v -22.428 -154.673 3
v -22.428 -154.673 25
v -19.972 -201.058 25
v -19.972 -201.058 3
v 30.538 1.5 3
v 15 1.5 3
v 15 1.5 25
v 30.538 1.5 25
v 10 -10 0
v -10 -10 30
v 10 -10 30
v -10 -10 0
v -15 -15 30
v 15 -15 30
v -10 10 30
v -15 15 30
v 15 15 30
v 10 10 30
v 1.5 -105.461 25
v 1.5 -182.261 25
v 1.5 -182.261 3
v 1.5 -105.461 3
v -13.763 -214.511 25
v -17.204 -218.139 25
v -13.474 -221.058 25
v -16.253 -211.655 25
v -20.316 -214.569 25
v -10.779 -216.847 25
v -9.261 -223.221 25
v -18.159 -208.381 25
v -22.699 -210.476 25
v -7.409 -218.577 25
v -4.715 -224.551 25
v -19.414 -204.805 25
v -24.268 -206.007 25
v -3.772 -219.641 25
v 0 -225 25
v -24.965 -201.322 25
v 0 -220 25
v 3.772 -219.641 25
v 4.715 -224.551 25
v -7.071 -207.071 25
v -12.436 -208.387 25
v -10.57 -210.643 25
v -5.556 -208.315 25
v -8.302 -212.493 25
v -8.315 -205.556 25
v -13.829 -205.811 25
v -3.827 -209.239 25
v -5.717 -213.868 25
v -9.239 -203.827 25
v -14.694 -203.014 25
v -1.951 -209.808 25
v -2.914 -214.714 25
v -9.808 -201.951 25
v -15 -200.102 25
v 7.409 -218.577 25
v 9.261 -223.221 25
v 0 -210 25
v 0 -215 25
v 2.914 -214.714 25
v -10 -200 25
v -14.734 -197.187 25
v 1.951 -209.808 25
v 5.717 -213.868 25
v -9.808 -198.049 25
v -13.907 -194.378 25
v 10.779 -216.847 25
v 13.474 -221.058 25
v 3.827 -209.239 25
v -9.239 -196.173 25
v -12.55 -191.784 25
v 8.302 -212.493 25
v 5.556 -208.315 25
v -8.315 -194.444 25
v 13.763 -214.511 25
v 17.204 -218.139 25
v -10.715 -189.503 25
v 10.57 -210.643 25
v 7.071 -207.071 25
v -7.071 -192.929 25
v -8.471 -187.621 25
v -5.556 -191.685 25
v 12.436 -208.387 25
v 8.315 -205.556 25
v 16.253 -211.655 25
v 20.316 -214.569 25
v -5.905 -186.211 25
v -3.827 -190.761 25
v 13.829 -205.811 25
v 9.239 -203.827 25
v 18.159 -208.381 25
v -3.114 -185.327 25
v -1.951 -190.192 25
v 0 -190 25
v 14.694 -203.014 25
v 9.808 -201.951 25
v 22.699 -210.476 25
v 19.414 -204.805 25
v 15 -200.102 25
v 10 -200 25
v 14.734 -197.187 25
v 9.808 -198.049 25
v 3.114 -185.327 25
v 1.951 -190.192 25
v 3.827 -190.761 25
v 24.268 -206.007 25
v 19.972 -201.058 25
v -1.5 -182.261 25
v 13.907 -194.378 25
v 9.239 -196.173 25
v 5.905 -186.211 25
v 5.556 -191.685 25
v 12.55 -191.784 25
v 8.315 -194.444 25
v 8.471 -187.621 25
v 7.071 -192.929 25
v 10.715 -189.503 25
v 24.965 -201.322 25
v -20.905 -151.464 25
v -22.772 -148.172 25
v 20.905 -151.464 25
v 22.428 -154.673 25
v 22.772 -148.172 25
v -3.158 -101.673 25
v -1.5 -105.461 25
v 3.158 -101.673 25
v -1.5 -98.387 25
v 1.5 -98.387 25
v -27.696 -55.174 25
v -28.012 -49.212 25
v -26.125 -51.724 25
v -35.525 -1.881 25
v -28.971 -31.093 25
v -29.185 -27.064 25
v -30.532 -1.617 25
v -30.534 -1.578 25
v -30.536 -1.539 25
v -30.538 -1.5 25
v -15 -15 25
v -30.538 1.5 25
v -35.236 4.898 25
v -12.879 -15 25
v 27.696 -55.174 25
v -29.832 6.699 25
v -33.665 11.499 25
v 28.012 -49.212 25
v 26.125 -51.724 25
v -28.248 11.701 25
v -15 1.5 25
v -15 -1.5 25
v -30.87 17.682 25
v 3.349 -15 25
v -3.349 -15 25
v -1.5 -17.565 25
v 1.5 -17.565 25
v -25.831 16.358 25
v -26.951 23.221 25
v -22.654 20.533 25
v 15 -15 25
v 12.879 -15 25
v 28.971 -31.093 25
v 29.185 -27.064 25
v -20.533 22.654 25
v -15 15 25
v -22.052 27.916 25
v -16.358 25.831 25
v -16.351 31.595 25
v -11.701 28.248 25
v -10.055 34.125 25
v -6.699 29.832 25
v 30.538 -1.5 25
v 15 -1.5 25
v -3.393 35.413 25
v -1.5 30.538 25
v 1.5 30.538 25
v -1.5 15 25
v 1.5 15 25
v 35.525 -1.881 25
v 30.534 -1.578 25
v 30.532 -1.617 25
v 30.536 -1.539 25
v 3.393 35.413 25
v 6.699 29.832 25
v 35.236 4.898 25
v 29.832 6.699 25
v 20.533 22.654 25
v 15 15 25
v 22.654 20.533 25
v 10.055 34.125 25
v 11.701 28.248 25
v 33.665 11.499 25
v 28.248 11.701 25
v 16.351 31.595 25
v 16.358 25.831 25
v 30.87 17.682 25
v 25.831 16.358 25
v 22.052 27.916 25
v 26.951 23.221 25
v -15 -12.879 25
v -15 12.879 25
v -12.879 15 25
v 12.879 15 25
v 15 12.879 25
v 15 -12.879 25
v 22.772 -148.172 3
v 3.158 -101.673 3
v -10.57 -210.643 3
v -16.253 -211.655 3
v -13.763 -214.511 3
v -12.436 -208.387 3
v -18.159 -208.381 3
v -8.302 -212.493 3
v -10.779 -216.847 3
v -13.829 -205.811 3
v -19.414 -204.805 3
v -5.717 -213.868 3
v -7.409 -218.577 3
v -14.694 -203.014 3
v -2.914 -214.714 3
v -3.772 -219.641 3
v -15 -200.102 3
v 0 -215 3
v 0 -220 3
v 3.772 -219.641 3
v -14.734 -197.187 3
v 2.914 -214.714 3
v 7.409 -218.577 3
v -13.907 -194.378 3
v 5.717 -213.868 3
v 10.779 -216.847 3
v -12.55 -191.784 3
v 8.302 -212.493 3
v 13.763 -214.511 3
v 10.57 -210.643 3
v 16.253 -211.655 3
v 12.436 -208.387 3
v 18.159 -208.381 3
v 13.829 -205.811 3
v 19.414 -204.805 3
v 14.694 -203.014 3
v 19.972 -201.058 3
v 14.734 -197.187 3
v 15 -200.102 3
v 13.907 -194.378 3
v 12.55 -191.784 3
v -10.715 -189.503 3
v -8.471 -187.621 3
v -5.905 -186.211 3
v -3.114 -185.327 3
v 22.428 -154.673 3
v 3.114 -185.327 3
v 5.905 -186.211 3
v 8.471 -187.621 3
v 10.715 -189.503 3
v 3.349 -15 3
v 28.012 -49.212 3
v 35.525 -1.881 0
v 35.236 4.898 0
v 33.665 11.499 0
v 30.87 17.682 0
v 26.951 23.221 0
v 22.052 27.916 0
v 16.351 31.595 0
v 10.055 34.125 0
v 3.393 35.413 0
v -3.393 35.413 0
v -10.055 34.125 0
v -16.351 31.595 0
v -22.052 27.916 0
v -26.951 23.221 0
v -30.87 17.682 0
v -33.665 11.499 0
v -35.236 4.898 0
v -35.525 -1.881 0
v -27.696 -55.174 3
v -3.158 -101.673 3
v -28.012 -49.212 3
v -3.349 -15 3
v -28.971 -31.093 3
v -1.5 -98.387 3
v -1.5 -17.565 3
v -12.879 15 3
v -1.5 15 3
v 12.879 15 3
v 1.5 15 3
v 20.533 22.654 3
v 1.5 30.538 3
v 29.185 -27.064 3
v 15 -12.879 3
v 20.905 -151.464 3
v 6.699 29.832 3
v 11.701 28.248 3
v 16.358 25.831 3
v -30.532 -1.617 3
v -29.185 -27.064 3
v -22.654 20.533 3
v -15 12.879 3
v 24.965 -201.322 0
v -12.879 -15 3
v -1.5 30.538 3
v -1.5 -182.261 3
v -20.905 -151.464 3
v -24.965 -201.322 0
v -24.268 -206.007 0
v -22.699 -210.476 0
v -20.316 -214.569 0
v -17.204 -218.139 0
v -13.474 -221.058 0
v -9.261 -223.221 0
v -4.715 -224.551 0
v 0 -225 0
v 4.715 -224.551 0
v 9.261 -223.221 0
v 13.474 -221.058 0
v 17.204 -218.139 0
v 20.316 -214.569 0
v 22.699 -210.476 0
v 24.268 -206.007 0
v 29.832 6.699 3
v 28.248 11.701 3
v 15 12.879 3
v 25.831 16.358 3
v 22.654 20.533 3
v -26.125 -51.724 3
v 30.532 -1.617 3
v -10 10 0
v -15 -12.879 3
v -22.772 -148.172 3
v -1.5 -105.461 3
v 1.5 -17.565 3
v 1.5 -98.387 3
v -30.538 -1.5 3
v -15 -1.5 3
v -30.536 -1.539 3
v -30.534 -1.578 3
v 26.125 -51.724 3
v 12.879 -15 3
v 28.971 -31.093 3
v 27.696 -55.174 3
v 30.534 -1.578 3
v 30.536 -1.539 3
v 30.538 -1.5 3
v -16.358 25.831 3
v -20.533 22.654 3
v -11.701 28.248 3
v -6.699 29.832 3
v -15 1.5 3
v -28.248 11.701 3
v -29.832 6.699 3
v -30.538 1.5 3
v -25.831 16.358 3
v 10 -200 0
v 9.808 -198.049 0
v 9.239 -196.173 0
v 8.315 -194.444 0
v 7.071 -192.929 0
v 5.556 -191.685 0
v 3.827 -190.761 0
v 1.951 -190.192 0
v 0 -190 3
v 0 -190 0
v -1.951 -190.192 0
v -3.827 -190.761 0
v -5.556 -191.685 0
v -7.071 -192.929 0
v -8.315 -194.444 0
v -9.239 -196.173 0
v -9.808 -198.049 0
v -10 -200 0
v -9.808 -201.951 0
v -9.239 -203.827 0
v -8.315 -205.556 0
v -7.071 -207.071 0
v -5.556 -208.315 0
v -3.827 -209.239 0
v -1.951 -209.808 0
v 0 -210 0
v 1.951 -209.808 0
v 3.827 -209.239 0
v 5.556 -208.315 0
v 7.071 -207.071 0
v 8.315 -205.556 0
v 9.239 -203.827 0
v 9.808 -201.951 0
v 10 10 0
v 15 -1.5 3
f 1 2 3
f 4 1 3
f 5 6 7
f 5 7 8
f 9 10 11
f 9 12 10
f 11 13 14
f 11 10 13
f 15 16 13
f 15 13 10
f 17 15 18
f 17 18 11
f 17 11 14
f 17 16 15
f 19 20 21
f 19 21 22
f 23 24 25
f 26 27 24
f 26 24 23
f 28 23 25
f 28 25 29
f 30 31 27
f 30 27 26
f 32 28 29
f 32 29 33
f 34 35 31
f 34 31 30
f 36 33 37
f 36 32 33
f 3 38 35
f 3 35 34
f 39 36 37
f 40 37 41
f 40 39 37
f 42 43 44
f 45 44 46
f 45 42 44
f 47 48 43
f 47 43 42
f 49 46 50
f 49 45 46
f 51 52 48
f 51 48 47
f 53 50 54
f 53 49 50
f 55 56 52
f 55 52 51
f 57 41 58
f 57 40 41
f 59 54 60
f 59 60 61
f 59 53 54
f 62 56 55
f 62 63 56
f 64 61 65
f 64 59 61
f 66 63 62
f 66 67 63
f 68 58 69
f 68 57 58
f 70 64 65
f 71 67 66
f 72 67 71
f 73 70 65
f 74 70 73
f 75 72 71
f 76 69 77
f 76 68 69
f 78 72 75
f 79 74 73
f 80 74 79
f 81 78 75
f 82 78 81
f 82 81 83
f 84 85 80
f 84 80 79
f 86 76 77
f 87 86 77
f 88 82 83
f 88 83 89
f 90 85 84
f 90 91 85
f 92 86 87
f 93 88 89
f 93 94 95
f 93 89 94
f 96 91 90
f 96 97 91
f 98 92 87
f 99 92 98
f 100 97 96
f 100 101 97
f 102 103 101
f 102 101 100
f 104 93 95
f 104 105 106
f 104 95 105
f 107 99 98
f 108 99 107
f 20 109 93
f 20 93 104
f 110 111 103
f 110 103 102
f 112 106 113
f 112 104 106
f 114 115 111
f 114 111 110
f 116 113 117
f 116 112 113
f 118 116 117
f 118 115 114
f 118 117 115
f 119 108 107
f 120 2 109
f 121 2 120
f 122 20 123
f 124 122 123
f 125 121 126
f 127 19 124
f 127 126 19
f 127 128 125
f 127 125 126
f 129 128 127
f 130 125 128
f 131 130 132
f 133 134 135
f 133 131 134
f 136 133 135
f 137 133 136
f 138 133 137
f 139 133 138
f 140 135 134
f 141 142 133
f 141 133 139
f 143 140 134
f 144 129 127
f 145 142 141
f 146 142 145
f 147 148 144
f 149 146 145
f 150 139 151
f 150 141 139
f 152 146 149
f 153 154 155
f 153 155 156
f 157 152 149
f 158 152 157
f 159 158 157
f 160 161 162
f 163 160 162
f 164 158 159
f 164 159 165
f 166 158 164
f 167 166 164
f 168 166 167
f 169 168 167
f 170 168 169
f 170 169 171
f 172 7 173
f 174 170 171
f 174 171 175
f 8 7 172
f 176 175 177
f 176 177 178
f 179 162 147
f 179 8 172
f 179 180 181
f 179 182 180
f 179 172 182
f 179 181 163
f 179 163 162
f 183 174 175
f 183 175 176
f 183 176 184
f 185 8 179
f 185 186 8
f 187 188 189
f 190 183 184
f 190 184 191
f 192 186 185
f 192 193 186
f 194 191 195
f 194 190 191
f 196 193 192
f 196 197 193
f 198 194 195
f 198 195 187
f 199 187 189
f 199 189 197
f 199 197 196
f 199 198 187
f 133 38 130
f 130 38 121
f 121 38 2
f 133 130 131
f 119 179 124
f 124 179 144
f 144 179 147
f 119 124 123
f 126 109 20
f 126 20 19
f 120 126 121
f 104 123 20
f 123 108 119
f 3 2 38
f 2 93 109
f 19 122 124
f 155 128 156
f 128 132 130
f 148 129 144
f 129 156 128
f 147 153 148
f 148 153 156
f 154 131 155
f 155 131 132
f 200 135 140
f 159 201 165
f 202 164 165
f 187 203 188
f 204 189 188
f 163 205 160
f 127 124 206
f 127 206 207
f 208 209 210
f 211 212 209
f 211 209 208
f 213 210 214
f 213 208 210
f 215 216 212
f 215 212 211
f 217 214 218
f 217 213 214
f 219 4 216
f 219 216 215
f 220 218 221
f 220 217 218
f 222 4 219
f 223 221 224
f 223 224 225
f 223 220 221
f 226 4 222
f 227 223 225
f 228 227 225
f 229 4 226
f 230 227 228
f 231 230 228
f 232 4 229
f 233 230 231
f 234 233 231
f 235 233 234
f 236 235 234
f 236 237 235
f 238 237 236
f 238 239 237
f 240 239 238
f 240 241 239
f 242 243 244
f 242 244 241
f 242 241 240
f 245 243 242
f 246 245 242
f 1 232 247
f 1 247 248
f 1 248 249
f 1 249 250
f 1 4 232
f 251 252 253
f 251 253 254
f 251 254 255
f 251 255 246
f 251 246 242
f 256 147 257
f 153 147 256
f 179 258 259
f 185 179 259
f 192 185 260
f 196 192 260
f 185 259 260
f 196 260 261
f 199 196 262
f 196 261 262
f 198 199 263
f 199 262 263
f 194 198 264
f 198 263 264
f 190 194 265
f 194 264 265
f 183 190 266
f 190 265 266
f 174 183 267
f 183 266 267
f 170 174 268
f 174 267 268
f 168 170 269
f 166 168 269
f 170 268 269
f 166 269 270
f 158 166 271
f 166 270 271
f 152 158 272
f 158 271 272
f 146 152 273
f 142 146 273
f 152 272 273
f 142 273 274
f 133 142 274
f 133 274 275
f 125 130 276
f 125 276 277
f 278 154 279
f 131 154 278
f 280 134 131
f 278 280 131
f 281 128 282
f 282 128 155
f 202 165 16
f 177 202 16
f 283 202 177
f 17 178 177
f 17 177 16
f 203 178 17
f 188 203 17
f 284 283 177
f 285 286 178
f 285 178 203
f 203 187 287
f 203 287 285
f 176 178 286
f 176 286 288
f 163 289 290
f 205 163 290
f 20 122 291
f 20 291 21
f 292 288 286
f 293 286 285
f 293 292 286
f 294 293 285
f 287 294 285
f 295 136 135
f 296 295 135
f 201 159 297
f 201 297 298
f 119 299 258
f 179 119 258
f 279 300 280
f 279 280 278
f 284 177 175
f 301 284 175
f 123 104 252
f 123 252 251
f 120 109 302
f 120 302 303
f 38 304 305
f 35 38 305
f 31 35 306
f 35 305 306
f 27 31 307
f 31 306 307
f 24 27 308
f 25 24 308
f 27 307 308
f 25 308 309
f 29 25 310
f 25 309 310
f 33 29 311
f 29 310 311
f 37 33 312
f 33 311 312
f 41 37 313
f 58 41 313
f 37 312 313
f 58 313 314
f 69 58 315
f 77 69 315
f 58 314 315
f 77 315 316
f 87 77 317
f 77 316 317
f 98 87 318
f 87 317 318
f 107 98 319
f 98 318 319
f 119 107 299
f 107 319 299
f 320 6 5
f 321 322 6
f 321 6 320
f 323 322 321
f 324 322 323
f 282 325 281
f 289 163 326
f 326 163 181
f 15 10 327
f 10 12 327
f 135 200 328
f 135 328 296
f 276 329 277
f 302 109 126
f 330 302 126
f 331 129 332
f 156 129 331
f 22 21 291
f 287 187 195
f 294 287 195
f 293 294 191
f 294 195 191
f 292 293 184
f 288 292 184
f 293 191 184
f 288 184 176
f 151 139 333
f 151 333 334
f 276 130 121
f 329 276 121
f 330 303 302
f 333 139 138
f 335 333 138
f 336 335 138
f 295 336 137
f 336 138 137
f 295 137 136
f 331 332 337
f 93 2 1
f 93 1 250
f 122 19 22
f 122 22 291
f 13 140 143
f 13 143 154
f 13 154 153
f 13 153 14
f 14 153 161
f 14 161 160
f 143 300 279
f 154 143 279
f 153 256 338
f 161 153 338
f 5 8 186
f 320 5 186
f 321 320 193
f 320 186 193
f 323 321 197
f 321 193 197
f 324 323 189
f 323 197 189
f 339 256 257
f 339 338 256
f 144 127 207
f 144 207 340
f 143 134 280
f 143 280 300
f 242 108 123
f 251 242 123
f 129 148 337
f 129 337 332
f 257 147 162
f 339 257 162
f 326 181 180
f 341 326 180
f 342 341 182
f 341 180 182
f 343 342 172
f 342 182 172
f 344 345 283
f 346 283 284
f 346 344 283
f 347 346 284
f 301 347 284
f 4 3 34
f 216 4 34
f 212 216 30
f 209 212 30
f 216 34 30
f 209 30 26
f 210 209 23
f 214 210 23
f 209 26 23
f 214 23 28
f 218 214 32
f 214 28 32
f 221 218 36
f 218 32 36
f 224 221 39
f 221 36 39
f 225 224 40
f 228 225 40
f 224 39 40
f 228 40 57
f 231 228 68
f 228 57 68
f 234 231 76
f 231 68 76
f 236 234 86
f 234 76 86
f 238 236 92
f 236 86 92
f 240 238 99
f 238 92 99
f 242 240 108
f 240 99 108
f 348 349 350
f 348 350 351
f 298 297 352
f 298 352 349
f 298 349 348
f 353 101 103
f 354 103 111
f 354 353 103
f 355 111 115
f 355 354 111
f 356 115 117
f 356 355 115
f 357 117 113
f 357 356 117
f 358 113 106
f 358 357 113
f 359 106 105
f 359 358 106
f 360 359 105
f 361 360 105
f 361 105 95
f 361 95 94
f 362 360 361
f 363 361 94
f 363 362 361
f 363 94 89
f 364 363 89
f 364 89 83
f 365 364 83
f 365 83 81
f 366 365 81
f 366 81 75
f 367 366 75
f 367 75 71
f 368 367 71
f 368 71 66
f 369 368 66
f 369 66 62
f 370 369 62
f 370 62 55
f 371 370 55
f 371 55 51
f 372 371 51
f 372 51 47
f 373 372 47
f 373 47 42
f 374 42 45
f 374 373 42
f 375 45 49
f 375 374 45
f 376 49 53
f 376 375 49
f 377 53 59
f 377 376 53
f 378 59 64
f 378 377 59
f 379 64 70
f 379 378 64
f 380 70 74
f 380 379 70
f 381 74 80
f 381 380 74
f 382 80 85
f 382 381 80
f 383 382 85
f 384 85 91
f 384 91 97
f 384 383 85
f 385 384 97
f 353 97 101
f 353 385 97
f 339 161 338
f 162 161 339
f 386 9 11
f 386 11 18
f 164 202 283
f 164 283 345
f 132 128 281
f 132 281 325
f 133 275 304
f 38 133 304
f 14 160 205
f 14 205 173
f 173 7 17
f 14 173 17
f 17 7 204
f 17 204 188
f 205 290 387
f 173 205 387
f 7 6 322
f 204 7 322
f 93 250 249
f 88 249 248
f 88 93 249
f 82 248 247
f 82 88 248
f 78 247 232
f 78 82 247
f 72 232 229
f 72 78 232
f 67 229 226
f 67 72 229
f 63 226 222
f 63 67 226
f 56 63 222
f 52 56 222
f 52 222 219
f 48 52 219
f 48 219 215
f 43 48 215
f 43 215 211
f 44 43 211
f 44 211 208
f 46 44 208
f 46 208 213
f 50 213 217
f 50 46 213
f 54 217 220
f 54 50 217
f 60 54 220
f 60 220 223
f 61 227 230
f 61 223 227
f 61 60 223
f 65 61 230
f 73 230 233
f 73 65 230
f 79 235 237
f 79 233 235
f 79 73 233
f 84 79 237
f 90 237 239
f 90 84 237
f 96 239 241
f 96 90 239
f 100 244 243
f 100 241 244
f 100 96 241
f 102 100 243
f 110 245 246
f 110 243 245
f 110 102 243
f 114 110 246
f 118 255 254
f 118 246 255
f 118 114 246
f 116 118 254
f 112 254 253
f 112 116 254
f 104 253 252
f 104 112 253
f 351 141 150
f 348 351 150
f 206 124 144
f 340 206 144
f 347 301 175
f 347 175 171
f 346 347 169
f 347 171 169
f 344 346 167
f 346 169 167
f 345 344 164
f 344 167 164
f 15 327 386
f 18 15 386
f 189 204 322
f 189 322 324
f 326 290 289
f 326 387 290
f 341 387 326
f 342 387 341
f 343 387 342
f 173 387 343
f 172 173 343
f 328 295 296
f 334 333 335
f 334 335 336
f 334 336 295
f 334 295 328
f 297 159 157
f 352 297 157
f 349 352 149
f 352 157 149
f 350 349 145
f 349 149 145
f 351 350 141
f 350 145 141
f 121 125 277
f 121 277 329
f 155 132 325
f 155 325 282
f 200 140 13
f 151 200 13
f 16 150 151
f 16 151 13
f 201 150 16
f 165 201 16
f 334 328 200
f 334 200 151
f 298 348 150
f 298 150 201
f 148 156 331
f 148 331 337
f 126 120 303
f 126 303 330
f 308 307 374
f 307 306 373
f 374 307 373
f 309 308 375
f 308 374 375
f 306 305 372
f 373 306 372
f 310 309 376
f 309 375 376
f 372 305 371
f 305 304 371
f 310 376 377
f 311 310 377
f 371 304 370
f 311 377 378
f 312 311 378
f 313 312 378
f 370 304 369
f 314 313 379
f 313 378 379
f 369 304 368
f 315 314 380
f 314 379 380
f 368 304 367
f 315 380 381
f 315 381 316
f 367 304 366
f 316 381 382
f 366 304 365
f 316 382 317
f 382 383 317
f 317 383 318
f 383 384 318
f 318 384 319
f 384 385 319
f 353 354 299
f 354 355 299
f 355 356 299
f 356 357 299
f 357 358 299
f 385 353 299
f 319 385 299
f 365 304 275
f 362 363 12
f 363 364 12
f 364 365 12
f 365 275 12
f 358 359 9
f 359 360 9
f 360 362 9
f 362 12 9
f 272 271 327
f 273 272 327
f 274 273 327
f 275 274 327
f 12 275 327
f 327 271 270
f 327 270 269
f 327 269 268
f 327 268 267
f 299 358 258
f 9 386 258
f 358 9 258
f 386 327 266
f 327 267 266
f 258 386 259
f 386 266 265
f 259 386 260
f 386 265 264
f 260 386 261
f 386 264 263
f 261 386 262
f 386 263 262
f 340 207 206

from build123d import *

# Parameters (mm, degrees)
SKETCH1_R           = 10
SKETCH1_W           = 20
SKETCH1_H           = 20
BOSS_EXTRUDE1_DEPTH = 25
SKETCH2_R           = 15
SKETCH2_W           = 30
SKETCH2_H           = 30
CUT_EXTRUDE1_DEPTH  = 22
SKETCH3_W           = 20.575
SKETCH3_H           = 3
SKETCH3_W_2         = 3
SKETCH3_H_2         = 20.575
SKETCH3_H_3         = 180
BOSS_EXTRUDE3_DEPTH = 22
BOSS_EXTRUDE4_DEPTH = 22
SKETCH7_W           = 30
SKETCH7_H           = 30
SKETCH7_W_2         = 20
SKETCH7_H_2         = 20
BOSS_EXTRUDE5_DEPTH = 5


with BuildPart() as part:
    # Sketch1 → Boss-Extrude1 (new body)
    with BuildSketch(Plane.XY):
        with BuildLine():
            Line((-35.525235512, -1.881028125), (-24.96502847, -201.321875))
            ThreePointArc((-24.96502847, -201.321875), (0, -225), (24.96502847, -201.321875))
            Line((24.96502847, -201.321875), (35.525235512, -1.881028125))
            ThreePointArc((35.525235512, -1.881028125), (0, 35.575), (-35.525235512, -1.881028125))
        make_face()
        with Locations((0, -200)):
            Circle(SKETCH1_R, mode=Mode.SUBTRACT)
        Rectangle(SKETCH1_W, SKETCH1_H, mode=Mode.SUBTRACT)
    extrude(amount=BOSS_EXTRUDE1_DEPTH)

    # Sketch2 → Cut-Extrude1 (cut)
    with BuildSketch(Plane.XY.offset(25)):
        with BuildLine():
            Line((-30.532229818, -1.616653125), (-19.972022776, -201.0575))
            ThreePointArc((-19.972022776, -201.0575), (0, -220), (19.972022776, -201.0575))
            Line((19.972022776, -201.0575), (30.532229818, -1.616653125))
            ThreePointArc((30.532229818, -1.616653125), (0, 30.575), (-30.532229818, -1.616653125))
        make_face()
        with Locations((0, -200)):
            Circle(SKETCH2_R, mode=Mode.SUBTRACT)
        Rectangle(SKETCH2_W, SKETCH2_H, mode=Mode.SUBTRACT)
    extrude(amount=-CUT_EXTRUDE1_DEPTH, mode=Mode.SUBTRACT)

    # Sketch3 → Boss-Extrude3 (add)
    with BuildSketch(Plane.XY.offset(25)):
        Polygon((-8.939339828, 11.060660172), (-20.559129663, 22.680450007), (-22.680450007, 20.559129663), (-11.060660172, 8.939339828), align=None)
        with Locations((-20.2875, 0)):
            Rectangle(SKETCH3_W, SKETCH3_H)
        with Locations((0, 20.2875)):
            Rectangle(SKETCH3_W_2, SKETCH3_H_2)
        with Locations((20.2875, 0)):
            Rectangle(SKETCH3_W, SKETCH3_H)
        with Locations((0, -100)):
            Rectangle(SKETCH3_W_2, SKETCH3_H_3)
        Polygon((11.060660172, 8.939339828), (22.680450007, 20.559129663), (20.559129663, 22.680450007), (8.939339828, 11.060660172), align=None)
        Polygon((8.939339828, -11.060660172), (28.971494515, -31.092814858), (31.092814858, -28.971494515), (11.060660172, -8.939339828), align=None)
        Polygon((-11.060660172, -8.939339828), (-31.092814858, -28.971494515), (-28.971494515, -31.092814858), (-8.939339828, -11.060660172), align=None)
    extrude(amount=-BOSS_EXTRUDE3_DEPTH)

    # Sketch6 → Boss-Extrude4 (add)
    with BuildSketch(Plane.XY.offset(25)):
        with BuildLine():
            Line((26.124834301, -51.724054412), (1.5, -98.387483985))
            Line((1.5, -98.387483985), (1.5, -105.460941502))
            Line((1.5, -105.460941502), (20.904572897, -151.463673485))
            Line((20.904572897, -151.463673485), (1.5, -182.26134041))
            Line((1.5, -182.26134041), (1.5, -185.075188443))
            ThreePointArc((1.5, -185.075188443), (2.310598263, -185.179030542), (3.11433813, -185.326864752))
            Line((3.11433813, -185.326864752), (22.428014316, -154.673463132))
            Line((22.428014316, -154.673463132), (22.772239511, -148.172400784))
            Line((22.772239511, -148.172400784), (3.158221033, -101.673132803))
            Line((3.158221033, -101.673132803), (27.696425353, -55.173864823))
            Line((27.696425353, -55.173864823), (28.012106126, -49.211894519))
            Line((28.012106126, -49.211894519), (3.349130043, -15))
            Line((3.349130043, -15), (1.5, -15))
            Line((1.5, -15), (1.5, -17.565069267))
            Line((1.5, -17.565069267), (26.124834301, -51.724054412))
        make_face()
        with BuildLine():
            Line((-1.5, -15), (-3.349130043, -15))
            Line((-3.349130043, -15), (-28.012106126, -49.211894519))
            Line((-28.012106126, -49.211894519), (-27.696425353, -55.173864823))
            Line((-27.696425353, -55.173864823), (-3.158221033, -101.673132803))
            Line((-3.158221033, -101.673132803), (-22.772239511, -148.172400784))
            Line((-22.772239511, -148.172400784), (-22.428014316, -154.673463132))
            Line((-22.428014316, -154.673463132), (-3.11433813, -185.326864752))
            ThreePointArc((-3.11433813, -185.326864752), (-2.310598263, -185.179030542), (-1.5, -185.075188443))
            Line((-1.5, -185.075188443), (-1.5, -182.26134041))
            Line((-1.5, -182.26134041), (-20.904572897, -151.463673485))
            Line((-20.904572897, -151.463673485), (-1.5, -105.460941502))
            Line((-1.5, -105.460941502), (-1.5, -98.387483985))
            Line((-1.5, -98.387483985), (-26.124834301, -51.724054412))
            Line((-26.124834301, -51.724054412), (-1.5, -17.565069267))
            Line((-1.5, -17.565069267), (-1.5, -15))
        make_face()
    extrude(amount=-BOSS_EXTRUDE4_DEPTH)

    # Sketch7 → Boss-Extrude5 (add)
    with BuildSketch(Plane.XY.offset(25)):
        Rectangle(SKETCH7_W, SKETCH7_H)
        Rectangle(SKETCH7_W_2, SKETCH7_H_2, mode=Mode.SUBTRACT)
    extrude(amount=BOSS_EXTRUDE5_DEPTH)


solid = part.part
